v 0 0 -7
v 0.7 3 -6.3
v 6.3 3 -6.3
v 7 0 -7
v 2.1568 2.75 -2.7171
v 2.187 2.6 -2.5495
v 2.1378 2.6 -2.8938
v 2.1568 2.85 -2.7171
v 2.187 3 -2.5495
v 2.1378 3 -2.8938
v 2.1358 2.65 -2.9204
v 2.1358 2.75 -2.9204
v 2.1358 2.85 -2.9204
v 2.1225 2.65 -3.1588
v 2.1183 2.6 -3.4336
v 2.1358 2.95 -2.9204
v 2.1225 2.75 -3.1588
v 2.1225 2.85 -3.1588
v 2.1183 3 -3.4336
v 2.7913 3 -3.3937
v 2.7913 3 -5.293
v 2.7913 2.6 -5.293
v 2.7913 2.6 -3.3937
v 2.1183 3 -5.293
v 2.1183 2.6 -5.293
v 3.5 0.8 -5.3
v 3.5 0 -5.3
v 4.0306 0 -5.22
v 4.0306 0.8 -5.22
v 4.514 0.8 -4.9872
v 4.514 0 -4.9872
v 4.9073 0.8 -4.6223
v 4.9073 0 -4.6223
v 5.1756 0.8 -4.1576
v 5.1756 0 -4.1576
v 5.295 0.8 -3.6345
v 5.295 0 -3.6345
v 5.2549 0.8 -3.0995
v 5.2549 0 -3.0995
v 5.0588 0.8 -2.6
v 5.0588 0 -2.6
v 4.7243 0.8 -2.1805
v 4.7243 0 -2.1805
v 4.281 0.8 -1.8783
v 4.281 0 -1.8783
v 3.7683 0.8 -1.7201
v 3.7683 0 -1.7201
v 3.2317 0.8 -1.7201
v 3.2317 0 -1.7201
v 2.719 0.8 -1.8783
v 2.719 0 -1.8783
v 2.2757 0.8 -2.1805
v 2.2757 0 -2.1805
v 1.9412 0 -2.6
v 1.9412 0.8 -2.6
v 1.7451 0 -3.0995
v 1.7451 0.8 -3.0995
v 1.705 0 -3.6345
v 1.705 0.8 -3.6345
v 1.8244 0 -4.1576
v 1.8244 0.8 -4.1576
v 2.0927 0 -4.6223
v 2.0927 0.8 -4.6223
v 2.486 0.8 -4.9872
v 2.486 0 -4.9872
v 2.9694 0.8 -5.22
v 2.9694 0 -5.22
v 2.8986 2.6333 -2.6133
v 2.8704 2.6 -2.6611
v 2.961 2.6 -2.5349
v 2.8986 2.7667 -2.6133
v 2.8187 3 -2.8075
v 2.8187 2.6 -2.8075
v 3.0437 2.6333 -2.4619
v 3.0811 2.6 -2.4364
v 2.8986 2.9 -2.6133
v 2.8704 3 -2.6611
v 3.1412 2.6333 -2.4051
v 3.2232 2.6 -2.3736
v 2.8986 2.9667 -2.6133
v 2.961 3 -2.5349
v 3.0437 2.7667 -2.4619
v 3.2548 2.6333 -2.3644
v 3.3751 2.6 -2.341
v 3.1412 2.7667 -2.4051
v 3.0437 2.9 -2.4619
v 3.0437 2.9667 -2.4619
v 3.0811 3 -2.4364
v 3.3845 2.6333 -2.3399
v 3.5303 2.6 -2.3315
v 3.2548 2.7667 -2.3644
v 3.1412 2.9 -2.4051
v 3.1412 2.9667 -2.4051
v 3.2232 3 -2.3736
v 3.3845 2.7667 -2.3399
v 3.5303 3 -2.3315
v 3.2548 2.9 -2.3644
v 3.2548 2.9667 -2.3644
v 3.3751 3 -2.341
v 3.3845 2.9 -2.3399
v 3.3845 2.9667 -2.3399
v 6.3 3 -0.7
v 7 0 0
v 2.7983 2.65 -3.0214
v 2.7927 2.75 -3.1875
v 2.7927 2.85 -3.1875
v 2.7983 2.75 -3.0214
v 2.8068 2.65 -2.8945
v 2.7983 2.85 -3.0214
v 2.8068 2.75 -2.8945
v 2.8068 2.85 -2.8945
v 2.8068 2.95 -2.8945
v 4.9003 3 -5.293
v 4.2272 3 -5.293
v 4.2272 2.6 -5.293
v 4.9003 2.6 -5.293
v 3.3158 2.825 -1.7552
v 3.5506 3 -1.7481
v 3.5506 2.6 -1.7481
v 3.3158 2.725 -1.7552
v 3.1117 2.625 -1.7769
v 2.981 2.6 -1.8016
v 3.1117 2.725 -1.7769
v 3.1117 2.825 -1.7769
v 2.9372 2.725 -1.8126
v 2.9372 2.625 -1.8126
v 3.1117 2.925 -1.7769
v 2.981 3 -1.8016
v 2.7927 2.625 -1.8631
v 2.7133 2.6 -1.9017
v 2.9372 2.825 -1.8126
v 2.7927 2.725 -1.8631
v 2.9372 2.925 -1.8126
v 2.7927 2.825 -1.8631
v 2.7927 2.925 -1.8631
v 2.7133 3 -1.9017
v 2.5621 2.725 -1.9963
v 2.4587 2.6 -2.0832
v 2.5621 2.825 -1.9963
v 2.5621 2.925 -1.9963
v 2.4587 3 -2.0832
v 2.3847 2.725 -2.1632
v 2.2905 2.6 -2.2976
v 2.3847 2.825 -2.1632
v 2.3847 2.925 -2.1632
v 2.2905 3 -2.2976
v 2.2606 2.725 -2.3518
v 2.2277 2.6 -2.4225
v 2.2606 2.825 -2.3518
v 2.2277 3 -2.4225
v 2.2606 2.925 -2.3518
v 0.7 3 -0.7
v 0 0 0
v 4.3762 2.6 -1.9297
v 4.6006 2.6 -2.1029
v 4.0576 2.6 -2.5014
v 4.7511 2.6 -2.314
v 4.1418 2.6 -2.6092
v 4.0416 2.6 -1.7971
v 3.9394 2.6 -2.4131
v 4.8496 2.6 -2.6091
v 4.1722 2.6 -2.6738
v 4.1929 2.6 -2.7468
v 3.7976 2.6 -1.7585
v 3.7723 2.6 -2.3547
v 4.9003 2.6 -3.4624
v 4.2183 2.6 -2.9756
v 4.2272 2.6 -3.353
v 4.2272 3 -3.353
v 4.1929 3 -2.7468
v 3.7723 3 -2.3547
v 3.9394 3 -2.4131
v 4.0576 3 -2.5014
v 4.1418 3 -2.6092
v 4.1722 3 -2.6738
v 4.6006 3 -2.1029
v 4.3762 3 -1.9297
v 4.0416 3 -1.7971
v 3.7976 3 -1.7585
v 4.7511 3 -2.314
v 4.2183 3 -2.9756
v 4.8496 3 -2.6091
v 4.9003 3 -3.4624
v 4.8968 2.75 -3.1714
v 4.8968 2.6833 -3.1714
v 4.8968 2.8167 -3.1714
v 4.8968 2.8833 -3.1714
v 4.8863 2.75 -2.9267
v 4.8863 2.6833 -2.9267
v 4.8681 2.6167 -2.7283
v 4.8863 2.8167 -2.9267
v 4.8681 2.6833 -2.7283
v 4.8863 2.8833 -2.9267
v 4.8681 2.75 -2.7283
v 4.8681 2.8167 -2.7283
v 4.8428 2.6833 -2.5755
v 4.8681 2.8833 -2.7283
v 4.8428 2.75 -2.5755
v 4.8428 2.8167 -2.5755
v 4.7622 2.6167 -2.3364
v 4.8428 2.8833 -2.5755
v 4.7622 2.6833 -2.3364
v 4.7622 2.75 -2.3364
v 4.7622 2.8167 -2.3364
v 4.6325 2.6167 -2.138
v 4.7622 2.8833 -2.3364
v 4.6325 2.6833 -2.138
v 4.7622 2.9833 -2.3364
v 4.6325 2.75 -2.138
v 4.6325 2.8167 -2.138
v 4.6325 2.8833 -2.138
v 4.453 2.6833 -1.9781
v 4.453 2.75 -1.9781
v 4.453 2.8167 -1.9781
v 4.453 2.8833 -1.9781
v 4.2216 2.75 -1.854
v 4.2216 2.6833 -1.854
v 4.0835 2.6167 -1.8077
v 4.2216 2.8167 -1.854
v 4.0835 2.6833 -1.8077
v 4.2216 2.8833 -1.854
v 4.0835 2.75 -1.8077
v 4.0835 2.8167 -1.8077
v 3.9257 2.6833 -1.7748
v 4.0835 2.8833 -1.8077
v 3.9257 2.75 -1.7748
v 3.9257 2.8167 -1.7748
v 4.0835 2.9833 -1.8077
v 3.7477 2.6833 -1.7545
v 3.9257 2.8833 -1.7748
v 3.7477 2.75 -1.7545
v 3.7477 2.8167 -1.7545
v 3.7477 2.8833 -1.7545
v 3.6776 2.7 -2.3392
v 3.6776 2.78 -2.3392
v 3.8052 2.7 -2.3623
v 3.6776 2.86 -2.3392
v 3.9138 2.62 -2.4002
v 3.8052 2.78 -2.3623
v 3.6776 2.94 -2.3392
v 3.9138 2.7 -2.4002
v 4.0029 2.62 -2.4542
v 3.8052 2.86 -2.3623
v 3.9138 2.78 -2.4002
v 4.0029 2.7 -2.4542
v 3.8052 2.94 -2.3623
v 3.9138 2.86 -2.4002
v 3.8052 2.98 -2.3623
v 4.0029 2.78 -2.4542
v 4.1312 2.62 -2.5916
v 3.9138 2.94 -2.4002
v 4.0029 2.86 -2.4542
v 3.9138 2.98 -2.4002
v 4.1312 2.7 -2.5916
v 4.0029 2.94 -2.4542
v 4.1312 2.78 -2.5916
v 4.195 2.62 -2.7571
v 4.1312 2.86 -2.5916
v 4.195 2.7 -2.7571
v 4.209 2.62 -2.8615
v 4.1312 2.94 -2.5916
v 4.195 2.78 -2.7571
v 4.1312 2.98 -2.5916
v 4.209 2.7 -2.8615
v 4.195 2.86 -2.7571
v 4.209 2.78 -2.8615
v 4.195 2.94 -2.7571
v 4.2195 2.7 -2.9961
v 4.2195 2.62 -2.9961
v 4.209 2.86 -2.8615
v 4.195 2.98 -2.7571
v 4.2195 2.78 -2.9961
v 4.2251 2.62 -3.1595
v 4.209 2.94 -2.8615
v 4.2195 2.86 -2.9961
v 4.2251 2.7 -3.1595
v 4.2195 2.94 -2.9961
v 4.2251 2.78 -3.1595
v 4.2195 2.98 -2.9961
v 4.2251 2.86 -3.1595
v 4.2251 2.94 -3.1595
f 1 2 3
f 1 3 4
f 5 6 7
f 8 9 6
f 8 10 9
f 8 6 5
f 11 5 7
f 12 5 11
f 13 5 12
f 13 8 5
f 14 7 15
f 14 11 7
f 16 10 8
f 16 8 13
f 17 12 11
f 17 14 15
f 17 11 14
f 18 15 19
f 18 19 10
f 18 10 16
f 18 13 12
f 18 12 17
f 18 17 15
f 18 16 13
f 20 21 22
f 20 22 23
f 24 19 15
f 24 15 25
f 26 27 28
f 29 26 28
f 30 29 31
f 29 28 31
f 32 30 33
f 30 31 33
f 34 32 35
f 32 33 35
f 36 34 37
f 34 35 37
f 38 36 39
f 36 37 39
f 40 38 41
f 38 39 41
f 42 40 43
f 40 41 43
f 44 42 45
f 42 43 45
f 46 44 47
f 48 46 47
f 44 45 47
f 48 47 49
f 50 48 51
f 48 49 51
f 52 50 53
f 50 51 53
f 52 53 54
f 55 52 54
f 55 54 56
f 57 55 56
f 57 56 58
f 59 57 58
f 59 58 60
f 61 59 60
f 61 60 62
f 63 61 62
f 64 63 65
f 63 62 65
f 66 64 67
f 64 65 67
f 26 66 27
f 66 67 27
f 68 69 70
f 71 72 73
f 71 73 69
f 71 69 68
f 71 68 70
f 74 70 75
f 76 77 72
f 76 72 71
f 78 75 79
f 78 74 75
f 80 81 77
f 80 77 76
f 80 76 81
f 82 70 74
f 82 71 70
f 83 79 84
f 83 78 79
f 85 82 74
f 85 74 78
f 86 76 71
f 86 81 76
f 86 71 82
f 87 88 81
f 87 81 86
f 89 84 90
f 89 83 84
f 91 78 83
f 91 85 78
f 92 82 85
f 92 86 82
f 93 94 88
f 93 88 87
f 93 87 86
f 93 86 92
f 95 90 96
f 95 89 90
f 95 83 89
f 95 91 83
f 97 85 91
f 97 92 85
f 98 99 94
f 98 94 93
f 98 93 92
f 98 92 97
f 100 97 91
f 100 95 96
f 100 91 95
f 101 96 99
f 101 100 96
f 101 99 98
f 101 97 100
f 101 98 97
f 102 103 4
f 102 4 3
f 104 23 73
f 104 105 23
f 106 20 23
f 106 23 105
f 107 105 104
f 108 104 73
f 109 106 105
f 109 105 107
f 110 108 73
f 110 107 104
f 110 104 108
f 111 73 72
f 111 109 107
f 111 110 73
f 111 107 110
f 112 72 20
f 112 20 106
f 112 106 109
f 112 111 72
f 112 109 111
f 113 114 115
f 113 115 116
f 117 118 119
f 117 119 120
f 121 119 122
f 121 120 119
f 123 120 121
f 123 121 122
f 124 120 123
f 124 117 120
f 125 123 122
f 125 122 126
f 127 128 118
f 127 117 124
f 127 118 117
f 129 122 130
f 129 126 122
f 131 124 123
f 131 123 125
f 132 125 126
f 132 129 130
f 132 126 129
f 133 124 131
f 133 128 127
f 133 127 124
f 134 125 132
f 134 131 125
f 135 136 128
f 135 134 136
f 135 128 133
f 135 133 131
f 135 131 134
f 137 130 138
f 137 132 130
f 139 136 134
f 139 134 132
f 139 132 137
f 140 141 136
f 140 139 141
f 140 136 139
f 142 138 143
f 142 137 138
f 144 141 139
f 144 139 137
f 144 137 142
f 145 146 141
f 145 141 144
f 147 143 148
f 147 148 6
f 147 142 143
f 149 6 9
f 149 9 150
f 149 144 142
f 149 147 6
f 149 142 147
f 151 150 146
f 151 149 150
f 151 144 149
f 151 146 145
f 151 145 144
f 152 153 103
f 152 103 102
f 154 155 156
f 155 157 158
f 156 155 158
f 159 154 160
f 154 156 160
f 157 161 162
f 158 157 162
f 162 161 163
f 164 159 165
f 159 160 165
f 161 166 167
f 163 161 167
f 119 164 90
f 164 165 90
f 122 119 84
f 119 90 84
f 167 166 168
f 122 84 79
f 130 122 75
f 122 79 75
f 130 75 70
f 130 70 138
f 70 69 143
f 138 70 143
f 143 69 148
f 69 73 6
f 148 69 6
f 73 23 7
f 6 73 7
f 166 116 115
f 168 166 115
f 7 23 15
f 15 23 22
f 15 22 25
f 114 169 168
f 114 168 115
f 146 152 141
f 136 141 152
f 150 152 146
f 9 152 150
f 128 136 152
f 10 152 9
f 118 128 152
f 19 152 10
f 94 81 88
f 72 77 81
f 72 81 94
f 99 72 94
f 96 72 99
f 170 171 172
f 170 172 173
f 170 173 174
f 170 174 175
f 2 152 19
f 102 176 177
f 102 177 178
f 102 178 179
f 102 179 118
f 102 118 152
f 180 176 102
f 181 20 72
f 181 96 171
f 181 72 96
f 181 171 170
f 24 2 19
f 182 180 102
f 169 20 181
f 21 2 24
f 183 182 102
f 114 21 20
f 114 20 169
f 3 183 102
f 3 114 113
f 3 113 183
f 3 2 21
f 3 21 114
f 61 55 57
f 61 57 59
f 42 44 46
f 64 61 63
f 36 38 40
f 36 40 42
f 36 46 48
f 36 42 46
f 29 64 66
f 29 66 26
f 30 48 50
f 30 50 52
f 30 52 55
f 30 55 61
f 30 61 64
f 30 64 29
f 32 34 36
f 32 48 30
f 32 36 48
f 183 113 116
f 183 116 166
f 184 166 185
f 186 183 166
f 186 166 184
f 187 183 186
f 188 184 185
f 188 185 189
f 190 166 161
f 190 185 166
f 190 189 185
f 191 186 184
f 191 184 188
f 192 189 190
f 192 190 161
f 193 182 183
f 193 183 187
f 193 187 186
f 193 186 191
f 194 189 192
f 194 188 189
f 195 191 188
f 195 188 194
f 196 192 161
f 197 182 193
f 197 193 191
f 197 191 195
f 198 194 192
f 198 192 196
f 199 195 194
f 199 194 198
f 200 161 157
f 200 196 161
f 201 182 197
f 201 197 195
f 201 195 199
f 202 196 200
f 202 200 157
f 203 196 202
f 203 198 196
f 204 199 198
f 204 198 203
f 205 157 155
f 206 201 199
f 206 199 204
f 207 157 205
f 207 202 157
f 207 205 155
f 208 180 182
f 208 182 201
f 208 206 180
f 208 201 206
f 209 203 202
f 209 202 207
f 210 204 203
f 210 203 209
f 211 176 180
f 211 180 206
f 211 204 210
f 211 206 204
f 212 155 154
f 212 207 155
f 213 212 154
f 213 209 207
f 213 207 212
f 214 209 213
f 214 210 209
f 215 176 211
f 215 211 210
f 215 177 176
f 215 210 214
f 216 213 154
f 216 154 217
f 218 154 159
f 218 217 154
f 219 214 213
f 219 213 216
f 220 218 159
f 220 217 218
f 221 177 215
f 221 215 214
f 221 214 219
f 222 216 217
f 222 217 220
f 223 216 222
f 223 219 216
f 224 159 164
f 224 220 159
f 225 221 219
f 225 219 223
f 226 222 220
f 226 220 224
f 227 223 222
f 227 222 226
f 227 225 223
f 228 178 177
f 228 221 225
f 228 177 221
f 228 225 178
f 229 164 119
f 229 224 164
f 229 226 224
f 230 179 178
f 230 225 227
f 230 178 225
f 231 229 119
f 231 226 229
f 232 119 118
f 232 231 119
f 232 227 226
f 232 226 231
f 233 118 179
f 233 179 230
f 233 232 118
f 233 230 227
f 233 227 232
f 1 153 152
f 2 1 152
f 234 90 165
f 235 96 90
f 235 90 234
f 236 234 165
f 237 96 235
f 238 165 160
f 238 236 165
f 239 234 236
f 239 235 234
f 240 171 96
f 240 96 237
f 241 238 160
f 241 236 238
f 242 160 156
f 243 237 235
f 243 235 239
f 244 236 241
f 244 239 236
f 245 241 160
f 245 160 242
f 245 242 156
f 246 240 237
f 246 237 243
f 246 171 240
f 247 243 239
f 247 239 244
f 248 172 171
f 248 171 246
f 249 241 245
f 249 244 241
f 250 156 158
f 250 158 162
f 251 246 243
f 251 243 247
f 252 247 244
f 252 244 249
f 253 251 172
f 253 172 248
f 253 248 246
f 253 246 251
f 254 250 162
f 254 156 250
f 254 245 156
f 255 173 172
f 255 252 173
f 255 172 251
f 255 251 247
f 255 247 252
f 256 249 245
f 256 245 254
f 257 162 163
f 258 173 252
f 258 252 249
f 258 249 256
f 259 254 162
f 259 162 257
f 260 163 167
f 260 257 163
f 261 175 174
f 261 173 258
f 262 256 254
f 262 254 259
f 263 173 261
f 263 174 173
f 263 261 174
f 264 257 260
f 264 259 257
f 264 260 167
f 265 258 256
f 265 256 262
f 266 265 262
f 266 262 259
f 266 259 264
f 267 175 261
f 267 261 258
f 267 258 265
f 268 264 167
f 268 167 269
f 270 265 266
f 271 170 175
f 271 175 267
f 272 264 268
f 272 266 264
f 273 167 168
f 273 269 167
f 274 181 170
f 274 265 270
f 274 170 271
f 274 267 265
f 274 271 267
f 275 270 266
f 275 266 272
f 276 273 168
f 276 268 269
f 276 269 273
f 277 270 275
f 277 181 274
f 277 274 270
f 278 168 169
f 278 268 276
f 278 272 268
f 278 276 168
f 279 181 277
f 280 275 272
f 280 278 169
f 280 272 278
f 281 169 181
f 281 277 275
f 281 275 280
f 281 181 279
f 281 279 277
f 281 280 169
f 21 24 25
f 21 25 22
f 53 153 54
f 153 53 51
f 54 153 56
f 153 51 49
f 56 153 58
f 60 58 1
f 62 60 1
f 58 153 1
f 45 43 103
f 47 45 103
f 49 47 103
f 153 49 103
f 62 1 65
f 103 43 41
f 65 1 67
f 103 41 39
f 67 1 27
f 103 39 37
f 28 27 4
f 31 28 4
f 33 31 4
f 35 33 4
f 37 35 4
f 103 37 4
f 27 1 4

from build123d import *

# Parameters (mm, degrees)
SKETCH1_W           = 7
SKETCH1_H           = 7
BOSS_EXTRUDE1_DEPTH = 3
CUT_EXTRUDE1_DEPTH  = 7
CUT_EXTRUDE2_DEPTH  = 11
SKETCH4_R           = 1.8
CUT_EXTRUDE3_DEPTH  = 0.8
CUT_EXTRUDE4_DEPTH  = 0.4


with BuildPart() as part:
    # Sketch1 → Boss-Extrude1 (new body)
    with BuildSketch(Plane(origin=(0, 0, 0), x_dir=(1, 0, 0), z_dir=(0, 1, 0))):
        with Locations((3.5, 3.5)):
            Rectangle(SKETCH1_W, SKETCH1_H)
    extrude(amount=BOSS_EXTRUDE1_DEPTH)

    # Sketch2 → Cut-Extrude1 (cut)
    with BuildSketch(Plane.XY):
        Polygon((0, 0), (0.7, 3), (0, 3), align=None)
        Polygon((7, 0), (6.3, 3), (7, 3), align=None)
    extrude(amount=-CUT_EXTRUDE1_DEPTH, mode=Mode.SUBTRACT)

    # Sketch3 → Cut-Extrude2 (cut)
    with BuildSketch(Plane(origin=(0, 0, 0), x_dir=(0, 0, -1), z_dir=(1, 0, 0))):
        Polygon((0, 0), (0.7, 3), (0, 3), align=None)
        Polygon((7, 3), (6.3, 3), (7, 0), align=None)
    extrude(amount=CUT_EXTRUDE2_DEPTH, mode=Mode.SUBTRACT)

    # Sketch4 → Cut-Extrude3 (cut)
    with BuildSketch(Plane.XZ):
        with Locations(Location((3.5, -3.5, 0), (0, 0, 270))):
            Circle(SKETCH4_R)
    extrude(amount=-CUT_EXTRUDE3_DEPTH, mode=Mode.SUBTRACT)

    # Sketch5 → Cut-Extrude4 (cut)
    with BuildSketch(Plane(origin=(0, 3, 0), x_dir=(1, 0, 0), z_dir=(0, 1, 0))):
        with BuildLine():
            Line((2.118256711, 5.29301719), (2.791333634, 5.29301719))
            Line((2.791333634, 5.29301719), (2.791333634, 3.393678247))
            add(Edge.make_bspline(
                [(2.791333634, 3.393678247), (2.79159059, 3.357687368), (2.792081143, 3.288977364), (2.792418818, 3.190811929), (2.794287554, 3.102674552), (2.798340091, 3.024423212), (2.801121459, 2.956097816), (2.806286157, 2.897685825), (2.811438338, 2.849209985), (2.816447496, 2.820376155), (2.818677384, 2.807540427)],
                knots=[0, 0, 0, 0, 1.470600056, 2.807515117, 4.011048972, 5.072079398, 6.00911328, 6.804506435, 7.467811572, 8, 8, 8, 8], degree=3))
            add(Edge.make_bspline(
                [(2.818677384, 2.807540427), (2.827870656, 2.772937179), (2.845973369, 2.704799015), (2.895871105, 2.611655954), (2.961785309, 2.529556211), (3.029020227, 2.471005878), (3.08983939, 2.429568298), (3.141500286, 2.404348789), (3.196312159, 2.381359585), (3.255433761, 2.363720163), (3.318230563, 2.348285034), (3.385461086, 2.339360335), (3.456557942, 2.33251085), (3.505290309, 2.331828921), (3.530316005, 2.331478728)],
                knots=[0, 0, 0, 0, 1.376921055, 2.711331395, 4.038631339, 5.418057255, 6.132954575, 6.870556231, 7.630397752, 8.422890386, 9.247036838, 10.121396817, 11.035274583, 12, 12, 12, 12], degree=3))
            add(Edge.make_bspline(
                [(3.530316005, 2.331478728), (3.555564197, 2.331936651), (3.604721911, 2.332828219), (3.67595983, 2.338137813), (3.742423591, 2.348155186), (3.804072535, 2.361289897), (3.86123227, 2.37788997), (3.913446785, 2.398907615), (3.960633797, 2.424200444), (4.016077825, 2.462322988), (4.075735526, 2.516101492), (4.133148446, 2.589220237), (4.174238425, 2.669935378), (4.193511366, 2.743634339), (4.203417011, 2.807845981), (4.209452062, 2.864033397), (4.214971422, 2.927618056), (4.219983422, 2.9984258), (4.223410988, 3.07650978), (4.225264898, 3.162067474), (4.226723935, 3.255085239), (4.227057995, 3.319592414), (4.22723107, 3.353013183)],
                knots=[0, 0, 0, 0, 1.036876239, 2.018776863, 2.930845756, 3.794842666, 4.605604932, 5.371924355, 6.101864688, 6.799283669, 8.1310906, 9.382718023, 10.597336334, 11.822035891, 12.492591141, 13.265194674, 14.141890321, 15.11351293, 16.179860579, 17.351049011, 18.627594861, 20, 20, 20, 20], degree=3))
            Line((4.22723107, 3.353013183), (4.22723107, 5.29301719))
            Line((4.22723107, 5.29301719), (4.900307993, 5.29301719))
            Line((4.900307993, 5.29301719), (4.900307993, 3.462388183))
            add(Edge.make_bspline(
                [(4.900307993, 3.462388183), (4.900221723, 3.411906909), (4.900055958, 3.314908527), (4.897467772, 3.175352057), (4.891967054, 3.047314846), (4.887360678, 2.930577419), (4.878475168, 2.825437586), (4.86917207, 2.731829975), (4.85718756, 2.649770945), (4.840097538, 2.556498932), (4.811376645, 2.451853735), (4.765088439, 2.336259695), (4.705930722, 2.231093862), (4.634139223, 2.135952726), (4.550127521, 2.050458146), (4.452637717, 1.97494623), (4.342672295, 1.908498965), (4.241901685, 1.860652783), (4.154042624, 1.828434731), (4.082482889, 1.806630998), (4.005897563, 1.788473049), (3.924376469, 1.774063102), (3.837884577, 1.761913385), (3.746390484, 1.753799365), (3.650032611, 1.748735644), (3.584309093, 1.748345307), (3.550648537, 1.748145395)],
                knots=[0, 0, 0, 0, 1.415574045, 2.719986624, 3.913607924, 5.00929969, 5.995467356, 6.871900228, 7.64671288, 8.320227872, 9.530145585, 10.682614022, 11.803571353, 12.90325401, 14.015460715, 15.154679255, 16.351678057, 17.612271512, 18.275764165, 18.974412946, 19.708786676, 20.481351116, 21.295095879, 22.157200529, 23.056203067, 24, 24, 24, 24], degree=3))
            add(Edge.make_bspline(
                [(3.550648537, 1.748145395), (3.510214347, 1.748662249), (3.431887293, 1.749663472), (3.318189063, 1.754129843), (3.212251246, 1.763348604), (3.113741005, 1.775808622), (3.022699014, 1.791826383), (2.938894957, 1.810975517), (2.862997887, 1.835177319), (2.772598387, 1.869743344), (2.671833064, 1.922617774), (2.562145747, 1.993151834), (2.465859145, 2.072762044), (2.383819281, 2.160670513), (2.315237148, 2.253787937), (2.259491992, 2.350099358), (2.214819658, 2.447999484), (2.196153021, 2.516041987), (2.186966646, 2.549527606)],
                knots=[0, 0, 0, 0, 1.128613534, 2.186292659, 3.174878439, 4.095586888, 4.95671962, 5.754129884, 6.492676435, 7.178284149, 8.453103036, 9.659838108, 10.813193309, 11.929983019, 13.007587775, 14.033493319, 15.032227051, 16, 16, 16, 16], degree=3))
            add(Edge.make_bspline(
                [(2.186966646, 2.549527606), (2.181344262, 2.575890465), (2.169501722, 2.631419074), (2.156051883, 2.719698679), (2.143781668, 2.816909308), (2.135400951, 2.923165946), (2.127456798, 3.038131461), (2.121753178, 3.16202262), (2.119407844, 3.294811291), (2.118648152, 3.386432941), (2.118256711, 3.43364219)],
                knots=[0, 0, 0, 0, 0.728071598, 1.533551606, 2.411422299, 3.374601532, 4.412367648, 5.524718474, 6.72457895, 8, 8, 8, 8], degree=3))
            Line((2.118256711, 3.43364219), (2.118256711, 5.29301719))
        make_face()
    extrude(amount=-CUT_EXTRUDE4_DEPTH, mode=Mode.SUBTRACT)


solid = part.part
